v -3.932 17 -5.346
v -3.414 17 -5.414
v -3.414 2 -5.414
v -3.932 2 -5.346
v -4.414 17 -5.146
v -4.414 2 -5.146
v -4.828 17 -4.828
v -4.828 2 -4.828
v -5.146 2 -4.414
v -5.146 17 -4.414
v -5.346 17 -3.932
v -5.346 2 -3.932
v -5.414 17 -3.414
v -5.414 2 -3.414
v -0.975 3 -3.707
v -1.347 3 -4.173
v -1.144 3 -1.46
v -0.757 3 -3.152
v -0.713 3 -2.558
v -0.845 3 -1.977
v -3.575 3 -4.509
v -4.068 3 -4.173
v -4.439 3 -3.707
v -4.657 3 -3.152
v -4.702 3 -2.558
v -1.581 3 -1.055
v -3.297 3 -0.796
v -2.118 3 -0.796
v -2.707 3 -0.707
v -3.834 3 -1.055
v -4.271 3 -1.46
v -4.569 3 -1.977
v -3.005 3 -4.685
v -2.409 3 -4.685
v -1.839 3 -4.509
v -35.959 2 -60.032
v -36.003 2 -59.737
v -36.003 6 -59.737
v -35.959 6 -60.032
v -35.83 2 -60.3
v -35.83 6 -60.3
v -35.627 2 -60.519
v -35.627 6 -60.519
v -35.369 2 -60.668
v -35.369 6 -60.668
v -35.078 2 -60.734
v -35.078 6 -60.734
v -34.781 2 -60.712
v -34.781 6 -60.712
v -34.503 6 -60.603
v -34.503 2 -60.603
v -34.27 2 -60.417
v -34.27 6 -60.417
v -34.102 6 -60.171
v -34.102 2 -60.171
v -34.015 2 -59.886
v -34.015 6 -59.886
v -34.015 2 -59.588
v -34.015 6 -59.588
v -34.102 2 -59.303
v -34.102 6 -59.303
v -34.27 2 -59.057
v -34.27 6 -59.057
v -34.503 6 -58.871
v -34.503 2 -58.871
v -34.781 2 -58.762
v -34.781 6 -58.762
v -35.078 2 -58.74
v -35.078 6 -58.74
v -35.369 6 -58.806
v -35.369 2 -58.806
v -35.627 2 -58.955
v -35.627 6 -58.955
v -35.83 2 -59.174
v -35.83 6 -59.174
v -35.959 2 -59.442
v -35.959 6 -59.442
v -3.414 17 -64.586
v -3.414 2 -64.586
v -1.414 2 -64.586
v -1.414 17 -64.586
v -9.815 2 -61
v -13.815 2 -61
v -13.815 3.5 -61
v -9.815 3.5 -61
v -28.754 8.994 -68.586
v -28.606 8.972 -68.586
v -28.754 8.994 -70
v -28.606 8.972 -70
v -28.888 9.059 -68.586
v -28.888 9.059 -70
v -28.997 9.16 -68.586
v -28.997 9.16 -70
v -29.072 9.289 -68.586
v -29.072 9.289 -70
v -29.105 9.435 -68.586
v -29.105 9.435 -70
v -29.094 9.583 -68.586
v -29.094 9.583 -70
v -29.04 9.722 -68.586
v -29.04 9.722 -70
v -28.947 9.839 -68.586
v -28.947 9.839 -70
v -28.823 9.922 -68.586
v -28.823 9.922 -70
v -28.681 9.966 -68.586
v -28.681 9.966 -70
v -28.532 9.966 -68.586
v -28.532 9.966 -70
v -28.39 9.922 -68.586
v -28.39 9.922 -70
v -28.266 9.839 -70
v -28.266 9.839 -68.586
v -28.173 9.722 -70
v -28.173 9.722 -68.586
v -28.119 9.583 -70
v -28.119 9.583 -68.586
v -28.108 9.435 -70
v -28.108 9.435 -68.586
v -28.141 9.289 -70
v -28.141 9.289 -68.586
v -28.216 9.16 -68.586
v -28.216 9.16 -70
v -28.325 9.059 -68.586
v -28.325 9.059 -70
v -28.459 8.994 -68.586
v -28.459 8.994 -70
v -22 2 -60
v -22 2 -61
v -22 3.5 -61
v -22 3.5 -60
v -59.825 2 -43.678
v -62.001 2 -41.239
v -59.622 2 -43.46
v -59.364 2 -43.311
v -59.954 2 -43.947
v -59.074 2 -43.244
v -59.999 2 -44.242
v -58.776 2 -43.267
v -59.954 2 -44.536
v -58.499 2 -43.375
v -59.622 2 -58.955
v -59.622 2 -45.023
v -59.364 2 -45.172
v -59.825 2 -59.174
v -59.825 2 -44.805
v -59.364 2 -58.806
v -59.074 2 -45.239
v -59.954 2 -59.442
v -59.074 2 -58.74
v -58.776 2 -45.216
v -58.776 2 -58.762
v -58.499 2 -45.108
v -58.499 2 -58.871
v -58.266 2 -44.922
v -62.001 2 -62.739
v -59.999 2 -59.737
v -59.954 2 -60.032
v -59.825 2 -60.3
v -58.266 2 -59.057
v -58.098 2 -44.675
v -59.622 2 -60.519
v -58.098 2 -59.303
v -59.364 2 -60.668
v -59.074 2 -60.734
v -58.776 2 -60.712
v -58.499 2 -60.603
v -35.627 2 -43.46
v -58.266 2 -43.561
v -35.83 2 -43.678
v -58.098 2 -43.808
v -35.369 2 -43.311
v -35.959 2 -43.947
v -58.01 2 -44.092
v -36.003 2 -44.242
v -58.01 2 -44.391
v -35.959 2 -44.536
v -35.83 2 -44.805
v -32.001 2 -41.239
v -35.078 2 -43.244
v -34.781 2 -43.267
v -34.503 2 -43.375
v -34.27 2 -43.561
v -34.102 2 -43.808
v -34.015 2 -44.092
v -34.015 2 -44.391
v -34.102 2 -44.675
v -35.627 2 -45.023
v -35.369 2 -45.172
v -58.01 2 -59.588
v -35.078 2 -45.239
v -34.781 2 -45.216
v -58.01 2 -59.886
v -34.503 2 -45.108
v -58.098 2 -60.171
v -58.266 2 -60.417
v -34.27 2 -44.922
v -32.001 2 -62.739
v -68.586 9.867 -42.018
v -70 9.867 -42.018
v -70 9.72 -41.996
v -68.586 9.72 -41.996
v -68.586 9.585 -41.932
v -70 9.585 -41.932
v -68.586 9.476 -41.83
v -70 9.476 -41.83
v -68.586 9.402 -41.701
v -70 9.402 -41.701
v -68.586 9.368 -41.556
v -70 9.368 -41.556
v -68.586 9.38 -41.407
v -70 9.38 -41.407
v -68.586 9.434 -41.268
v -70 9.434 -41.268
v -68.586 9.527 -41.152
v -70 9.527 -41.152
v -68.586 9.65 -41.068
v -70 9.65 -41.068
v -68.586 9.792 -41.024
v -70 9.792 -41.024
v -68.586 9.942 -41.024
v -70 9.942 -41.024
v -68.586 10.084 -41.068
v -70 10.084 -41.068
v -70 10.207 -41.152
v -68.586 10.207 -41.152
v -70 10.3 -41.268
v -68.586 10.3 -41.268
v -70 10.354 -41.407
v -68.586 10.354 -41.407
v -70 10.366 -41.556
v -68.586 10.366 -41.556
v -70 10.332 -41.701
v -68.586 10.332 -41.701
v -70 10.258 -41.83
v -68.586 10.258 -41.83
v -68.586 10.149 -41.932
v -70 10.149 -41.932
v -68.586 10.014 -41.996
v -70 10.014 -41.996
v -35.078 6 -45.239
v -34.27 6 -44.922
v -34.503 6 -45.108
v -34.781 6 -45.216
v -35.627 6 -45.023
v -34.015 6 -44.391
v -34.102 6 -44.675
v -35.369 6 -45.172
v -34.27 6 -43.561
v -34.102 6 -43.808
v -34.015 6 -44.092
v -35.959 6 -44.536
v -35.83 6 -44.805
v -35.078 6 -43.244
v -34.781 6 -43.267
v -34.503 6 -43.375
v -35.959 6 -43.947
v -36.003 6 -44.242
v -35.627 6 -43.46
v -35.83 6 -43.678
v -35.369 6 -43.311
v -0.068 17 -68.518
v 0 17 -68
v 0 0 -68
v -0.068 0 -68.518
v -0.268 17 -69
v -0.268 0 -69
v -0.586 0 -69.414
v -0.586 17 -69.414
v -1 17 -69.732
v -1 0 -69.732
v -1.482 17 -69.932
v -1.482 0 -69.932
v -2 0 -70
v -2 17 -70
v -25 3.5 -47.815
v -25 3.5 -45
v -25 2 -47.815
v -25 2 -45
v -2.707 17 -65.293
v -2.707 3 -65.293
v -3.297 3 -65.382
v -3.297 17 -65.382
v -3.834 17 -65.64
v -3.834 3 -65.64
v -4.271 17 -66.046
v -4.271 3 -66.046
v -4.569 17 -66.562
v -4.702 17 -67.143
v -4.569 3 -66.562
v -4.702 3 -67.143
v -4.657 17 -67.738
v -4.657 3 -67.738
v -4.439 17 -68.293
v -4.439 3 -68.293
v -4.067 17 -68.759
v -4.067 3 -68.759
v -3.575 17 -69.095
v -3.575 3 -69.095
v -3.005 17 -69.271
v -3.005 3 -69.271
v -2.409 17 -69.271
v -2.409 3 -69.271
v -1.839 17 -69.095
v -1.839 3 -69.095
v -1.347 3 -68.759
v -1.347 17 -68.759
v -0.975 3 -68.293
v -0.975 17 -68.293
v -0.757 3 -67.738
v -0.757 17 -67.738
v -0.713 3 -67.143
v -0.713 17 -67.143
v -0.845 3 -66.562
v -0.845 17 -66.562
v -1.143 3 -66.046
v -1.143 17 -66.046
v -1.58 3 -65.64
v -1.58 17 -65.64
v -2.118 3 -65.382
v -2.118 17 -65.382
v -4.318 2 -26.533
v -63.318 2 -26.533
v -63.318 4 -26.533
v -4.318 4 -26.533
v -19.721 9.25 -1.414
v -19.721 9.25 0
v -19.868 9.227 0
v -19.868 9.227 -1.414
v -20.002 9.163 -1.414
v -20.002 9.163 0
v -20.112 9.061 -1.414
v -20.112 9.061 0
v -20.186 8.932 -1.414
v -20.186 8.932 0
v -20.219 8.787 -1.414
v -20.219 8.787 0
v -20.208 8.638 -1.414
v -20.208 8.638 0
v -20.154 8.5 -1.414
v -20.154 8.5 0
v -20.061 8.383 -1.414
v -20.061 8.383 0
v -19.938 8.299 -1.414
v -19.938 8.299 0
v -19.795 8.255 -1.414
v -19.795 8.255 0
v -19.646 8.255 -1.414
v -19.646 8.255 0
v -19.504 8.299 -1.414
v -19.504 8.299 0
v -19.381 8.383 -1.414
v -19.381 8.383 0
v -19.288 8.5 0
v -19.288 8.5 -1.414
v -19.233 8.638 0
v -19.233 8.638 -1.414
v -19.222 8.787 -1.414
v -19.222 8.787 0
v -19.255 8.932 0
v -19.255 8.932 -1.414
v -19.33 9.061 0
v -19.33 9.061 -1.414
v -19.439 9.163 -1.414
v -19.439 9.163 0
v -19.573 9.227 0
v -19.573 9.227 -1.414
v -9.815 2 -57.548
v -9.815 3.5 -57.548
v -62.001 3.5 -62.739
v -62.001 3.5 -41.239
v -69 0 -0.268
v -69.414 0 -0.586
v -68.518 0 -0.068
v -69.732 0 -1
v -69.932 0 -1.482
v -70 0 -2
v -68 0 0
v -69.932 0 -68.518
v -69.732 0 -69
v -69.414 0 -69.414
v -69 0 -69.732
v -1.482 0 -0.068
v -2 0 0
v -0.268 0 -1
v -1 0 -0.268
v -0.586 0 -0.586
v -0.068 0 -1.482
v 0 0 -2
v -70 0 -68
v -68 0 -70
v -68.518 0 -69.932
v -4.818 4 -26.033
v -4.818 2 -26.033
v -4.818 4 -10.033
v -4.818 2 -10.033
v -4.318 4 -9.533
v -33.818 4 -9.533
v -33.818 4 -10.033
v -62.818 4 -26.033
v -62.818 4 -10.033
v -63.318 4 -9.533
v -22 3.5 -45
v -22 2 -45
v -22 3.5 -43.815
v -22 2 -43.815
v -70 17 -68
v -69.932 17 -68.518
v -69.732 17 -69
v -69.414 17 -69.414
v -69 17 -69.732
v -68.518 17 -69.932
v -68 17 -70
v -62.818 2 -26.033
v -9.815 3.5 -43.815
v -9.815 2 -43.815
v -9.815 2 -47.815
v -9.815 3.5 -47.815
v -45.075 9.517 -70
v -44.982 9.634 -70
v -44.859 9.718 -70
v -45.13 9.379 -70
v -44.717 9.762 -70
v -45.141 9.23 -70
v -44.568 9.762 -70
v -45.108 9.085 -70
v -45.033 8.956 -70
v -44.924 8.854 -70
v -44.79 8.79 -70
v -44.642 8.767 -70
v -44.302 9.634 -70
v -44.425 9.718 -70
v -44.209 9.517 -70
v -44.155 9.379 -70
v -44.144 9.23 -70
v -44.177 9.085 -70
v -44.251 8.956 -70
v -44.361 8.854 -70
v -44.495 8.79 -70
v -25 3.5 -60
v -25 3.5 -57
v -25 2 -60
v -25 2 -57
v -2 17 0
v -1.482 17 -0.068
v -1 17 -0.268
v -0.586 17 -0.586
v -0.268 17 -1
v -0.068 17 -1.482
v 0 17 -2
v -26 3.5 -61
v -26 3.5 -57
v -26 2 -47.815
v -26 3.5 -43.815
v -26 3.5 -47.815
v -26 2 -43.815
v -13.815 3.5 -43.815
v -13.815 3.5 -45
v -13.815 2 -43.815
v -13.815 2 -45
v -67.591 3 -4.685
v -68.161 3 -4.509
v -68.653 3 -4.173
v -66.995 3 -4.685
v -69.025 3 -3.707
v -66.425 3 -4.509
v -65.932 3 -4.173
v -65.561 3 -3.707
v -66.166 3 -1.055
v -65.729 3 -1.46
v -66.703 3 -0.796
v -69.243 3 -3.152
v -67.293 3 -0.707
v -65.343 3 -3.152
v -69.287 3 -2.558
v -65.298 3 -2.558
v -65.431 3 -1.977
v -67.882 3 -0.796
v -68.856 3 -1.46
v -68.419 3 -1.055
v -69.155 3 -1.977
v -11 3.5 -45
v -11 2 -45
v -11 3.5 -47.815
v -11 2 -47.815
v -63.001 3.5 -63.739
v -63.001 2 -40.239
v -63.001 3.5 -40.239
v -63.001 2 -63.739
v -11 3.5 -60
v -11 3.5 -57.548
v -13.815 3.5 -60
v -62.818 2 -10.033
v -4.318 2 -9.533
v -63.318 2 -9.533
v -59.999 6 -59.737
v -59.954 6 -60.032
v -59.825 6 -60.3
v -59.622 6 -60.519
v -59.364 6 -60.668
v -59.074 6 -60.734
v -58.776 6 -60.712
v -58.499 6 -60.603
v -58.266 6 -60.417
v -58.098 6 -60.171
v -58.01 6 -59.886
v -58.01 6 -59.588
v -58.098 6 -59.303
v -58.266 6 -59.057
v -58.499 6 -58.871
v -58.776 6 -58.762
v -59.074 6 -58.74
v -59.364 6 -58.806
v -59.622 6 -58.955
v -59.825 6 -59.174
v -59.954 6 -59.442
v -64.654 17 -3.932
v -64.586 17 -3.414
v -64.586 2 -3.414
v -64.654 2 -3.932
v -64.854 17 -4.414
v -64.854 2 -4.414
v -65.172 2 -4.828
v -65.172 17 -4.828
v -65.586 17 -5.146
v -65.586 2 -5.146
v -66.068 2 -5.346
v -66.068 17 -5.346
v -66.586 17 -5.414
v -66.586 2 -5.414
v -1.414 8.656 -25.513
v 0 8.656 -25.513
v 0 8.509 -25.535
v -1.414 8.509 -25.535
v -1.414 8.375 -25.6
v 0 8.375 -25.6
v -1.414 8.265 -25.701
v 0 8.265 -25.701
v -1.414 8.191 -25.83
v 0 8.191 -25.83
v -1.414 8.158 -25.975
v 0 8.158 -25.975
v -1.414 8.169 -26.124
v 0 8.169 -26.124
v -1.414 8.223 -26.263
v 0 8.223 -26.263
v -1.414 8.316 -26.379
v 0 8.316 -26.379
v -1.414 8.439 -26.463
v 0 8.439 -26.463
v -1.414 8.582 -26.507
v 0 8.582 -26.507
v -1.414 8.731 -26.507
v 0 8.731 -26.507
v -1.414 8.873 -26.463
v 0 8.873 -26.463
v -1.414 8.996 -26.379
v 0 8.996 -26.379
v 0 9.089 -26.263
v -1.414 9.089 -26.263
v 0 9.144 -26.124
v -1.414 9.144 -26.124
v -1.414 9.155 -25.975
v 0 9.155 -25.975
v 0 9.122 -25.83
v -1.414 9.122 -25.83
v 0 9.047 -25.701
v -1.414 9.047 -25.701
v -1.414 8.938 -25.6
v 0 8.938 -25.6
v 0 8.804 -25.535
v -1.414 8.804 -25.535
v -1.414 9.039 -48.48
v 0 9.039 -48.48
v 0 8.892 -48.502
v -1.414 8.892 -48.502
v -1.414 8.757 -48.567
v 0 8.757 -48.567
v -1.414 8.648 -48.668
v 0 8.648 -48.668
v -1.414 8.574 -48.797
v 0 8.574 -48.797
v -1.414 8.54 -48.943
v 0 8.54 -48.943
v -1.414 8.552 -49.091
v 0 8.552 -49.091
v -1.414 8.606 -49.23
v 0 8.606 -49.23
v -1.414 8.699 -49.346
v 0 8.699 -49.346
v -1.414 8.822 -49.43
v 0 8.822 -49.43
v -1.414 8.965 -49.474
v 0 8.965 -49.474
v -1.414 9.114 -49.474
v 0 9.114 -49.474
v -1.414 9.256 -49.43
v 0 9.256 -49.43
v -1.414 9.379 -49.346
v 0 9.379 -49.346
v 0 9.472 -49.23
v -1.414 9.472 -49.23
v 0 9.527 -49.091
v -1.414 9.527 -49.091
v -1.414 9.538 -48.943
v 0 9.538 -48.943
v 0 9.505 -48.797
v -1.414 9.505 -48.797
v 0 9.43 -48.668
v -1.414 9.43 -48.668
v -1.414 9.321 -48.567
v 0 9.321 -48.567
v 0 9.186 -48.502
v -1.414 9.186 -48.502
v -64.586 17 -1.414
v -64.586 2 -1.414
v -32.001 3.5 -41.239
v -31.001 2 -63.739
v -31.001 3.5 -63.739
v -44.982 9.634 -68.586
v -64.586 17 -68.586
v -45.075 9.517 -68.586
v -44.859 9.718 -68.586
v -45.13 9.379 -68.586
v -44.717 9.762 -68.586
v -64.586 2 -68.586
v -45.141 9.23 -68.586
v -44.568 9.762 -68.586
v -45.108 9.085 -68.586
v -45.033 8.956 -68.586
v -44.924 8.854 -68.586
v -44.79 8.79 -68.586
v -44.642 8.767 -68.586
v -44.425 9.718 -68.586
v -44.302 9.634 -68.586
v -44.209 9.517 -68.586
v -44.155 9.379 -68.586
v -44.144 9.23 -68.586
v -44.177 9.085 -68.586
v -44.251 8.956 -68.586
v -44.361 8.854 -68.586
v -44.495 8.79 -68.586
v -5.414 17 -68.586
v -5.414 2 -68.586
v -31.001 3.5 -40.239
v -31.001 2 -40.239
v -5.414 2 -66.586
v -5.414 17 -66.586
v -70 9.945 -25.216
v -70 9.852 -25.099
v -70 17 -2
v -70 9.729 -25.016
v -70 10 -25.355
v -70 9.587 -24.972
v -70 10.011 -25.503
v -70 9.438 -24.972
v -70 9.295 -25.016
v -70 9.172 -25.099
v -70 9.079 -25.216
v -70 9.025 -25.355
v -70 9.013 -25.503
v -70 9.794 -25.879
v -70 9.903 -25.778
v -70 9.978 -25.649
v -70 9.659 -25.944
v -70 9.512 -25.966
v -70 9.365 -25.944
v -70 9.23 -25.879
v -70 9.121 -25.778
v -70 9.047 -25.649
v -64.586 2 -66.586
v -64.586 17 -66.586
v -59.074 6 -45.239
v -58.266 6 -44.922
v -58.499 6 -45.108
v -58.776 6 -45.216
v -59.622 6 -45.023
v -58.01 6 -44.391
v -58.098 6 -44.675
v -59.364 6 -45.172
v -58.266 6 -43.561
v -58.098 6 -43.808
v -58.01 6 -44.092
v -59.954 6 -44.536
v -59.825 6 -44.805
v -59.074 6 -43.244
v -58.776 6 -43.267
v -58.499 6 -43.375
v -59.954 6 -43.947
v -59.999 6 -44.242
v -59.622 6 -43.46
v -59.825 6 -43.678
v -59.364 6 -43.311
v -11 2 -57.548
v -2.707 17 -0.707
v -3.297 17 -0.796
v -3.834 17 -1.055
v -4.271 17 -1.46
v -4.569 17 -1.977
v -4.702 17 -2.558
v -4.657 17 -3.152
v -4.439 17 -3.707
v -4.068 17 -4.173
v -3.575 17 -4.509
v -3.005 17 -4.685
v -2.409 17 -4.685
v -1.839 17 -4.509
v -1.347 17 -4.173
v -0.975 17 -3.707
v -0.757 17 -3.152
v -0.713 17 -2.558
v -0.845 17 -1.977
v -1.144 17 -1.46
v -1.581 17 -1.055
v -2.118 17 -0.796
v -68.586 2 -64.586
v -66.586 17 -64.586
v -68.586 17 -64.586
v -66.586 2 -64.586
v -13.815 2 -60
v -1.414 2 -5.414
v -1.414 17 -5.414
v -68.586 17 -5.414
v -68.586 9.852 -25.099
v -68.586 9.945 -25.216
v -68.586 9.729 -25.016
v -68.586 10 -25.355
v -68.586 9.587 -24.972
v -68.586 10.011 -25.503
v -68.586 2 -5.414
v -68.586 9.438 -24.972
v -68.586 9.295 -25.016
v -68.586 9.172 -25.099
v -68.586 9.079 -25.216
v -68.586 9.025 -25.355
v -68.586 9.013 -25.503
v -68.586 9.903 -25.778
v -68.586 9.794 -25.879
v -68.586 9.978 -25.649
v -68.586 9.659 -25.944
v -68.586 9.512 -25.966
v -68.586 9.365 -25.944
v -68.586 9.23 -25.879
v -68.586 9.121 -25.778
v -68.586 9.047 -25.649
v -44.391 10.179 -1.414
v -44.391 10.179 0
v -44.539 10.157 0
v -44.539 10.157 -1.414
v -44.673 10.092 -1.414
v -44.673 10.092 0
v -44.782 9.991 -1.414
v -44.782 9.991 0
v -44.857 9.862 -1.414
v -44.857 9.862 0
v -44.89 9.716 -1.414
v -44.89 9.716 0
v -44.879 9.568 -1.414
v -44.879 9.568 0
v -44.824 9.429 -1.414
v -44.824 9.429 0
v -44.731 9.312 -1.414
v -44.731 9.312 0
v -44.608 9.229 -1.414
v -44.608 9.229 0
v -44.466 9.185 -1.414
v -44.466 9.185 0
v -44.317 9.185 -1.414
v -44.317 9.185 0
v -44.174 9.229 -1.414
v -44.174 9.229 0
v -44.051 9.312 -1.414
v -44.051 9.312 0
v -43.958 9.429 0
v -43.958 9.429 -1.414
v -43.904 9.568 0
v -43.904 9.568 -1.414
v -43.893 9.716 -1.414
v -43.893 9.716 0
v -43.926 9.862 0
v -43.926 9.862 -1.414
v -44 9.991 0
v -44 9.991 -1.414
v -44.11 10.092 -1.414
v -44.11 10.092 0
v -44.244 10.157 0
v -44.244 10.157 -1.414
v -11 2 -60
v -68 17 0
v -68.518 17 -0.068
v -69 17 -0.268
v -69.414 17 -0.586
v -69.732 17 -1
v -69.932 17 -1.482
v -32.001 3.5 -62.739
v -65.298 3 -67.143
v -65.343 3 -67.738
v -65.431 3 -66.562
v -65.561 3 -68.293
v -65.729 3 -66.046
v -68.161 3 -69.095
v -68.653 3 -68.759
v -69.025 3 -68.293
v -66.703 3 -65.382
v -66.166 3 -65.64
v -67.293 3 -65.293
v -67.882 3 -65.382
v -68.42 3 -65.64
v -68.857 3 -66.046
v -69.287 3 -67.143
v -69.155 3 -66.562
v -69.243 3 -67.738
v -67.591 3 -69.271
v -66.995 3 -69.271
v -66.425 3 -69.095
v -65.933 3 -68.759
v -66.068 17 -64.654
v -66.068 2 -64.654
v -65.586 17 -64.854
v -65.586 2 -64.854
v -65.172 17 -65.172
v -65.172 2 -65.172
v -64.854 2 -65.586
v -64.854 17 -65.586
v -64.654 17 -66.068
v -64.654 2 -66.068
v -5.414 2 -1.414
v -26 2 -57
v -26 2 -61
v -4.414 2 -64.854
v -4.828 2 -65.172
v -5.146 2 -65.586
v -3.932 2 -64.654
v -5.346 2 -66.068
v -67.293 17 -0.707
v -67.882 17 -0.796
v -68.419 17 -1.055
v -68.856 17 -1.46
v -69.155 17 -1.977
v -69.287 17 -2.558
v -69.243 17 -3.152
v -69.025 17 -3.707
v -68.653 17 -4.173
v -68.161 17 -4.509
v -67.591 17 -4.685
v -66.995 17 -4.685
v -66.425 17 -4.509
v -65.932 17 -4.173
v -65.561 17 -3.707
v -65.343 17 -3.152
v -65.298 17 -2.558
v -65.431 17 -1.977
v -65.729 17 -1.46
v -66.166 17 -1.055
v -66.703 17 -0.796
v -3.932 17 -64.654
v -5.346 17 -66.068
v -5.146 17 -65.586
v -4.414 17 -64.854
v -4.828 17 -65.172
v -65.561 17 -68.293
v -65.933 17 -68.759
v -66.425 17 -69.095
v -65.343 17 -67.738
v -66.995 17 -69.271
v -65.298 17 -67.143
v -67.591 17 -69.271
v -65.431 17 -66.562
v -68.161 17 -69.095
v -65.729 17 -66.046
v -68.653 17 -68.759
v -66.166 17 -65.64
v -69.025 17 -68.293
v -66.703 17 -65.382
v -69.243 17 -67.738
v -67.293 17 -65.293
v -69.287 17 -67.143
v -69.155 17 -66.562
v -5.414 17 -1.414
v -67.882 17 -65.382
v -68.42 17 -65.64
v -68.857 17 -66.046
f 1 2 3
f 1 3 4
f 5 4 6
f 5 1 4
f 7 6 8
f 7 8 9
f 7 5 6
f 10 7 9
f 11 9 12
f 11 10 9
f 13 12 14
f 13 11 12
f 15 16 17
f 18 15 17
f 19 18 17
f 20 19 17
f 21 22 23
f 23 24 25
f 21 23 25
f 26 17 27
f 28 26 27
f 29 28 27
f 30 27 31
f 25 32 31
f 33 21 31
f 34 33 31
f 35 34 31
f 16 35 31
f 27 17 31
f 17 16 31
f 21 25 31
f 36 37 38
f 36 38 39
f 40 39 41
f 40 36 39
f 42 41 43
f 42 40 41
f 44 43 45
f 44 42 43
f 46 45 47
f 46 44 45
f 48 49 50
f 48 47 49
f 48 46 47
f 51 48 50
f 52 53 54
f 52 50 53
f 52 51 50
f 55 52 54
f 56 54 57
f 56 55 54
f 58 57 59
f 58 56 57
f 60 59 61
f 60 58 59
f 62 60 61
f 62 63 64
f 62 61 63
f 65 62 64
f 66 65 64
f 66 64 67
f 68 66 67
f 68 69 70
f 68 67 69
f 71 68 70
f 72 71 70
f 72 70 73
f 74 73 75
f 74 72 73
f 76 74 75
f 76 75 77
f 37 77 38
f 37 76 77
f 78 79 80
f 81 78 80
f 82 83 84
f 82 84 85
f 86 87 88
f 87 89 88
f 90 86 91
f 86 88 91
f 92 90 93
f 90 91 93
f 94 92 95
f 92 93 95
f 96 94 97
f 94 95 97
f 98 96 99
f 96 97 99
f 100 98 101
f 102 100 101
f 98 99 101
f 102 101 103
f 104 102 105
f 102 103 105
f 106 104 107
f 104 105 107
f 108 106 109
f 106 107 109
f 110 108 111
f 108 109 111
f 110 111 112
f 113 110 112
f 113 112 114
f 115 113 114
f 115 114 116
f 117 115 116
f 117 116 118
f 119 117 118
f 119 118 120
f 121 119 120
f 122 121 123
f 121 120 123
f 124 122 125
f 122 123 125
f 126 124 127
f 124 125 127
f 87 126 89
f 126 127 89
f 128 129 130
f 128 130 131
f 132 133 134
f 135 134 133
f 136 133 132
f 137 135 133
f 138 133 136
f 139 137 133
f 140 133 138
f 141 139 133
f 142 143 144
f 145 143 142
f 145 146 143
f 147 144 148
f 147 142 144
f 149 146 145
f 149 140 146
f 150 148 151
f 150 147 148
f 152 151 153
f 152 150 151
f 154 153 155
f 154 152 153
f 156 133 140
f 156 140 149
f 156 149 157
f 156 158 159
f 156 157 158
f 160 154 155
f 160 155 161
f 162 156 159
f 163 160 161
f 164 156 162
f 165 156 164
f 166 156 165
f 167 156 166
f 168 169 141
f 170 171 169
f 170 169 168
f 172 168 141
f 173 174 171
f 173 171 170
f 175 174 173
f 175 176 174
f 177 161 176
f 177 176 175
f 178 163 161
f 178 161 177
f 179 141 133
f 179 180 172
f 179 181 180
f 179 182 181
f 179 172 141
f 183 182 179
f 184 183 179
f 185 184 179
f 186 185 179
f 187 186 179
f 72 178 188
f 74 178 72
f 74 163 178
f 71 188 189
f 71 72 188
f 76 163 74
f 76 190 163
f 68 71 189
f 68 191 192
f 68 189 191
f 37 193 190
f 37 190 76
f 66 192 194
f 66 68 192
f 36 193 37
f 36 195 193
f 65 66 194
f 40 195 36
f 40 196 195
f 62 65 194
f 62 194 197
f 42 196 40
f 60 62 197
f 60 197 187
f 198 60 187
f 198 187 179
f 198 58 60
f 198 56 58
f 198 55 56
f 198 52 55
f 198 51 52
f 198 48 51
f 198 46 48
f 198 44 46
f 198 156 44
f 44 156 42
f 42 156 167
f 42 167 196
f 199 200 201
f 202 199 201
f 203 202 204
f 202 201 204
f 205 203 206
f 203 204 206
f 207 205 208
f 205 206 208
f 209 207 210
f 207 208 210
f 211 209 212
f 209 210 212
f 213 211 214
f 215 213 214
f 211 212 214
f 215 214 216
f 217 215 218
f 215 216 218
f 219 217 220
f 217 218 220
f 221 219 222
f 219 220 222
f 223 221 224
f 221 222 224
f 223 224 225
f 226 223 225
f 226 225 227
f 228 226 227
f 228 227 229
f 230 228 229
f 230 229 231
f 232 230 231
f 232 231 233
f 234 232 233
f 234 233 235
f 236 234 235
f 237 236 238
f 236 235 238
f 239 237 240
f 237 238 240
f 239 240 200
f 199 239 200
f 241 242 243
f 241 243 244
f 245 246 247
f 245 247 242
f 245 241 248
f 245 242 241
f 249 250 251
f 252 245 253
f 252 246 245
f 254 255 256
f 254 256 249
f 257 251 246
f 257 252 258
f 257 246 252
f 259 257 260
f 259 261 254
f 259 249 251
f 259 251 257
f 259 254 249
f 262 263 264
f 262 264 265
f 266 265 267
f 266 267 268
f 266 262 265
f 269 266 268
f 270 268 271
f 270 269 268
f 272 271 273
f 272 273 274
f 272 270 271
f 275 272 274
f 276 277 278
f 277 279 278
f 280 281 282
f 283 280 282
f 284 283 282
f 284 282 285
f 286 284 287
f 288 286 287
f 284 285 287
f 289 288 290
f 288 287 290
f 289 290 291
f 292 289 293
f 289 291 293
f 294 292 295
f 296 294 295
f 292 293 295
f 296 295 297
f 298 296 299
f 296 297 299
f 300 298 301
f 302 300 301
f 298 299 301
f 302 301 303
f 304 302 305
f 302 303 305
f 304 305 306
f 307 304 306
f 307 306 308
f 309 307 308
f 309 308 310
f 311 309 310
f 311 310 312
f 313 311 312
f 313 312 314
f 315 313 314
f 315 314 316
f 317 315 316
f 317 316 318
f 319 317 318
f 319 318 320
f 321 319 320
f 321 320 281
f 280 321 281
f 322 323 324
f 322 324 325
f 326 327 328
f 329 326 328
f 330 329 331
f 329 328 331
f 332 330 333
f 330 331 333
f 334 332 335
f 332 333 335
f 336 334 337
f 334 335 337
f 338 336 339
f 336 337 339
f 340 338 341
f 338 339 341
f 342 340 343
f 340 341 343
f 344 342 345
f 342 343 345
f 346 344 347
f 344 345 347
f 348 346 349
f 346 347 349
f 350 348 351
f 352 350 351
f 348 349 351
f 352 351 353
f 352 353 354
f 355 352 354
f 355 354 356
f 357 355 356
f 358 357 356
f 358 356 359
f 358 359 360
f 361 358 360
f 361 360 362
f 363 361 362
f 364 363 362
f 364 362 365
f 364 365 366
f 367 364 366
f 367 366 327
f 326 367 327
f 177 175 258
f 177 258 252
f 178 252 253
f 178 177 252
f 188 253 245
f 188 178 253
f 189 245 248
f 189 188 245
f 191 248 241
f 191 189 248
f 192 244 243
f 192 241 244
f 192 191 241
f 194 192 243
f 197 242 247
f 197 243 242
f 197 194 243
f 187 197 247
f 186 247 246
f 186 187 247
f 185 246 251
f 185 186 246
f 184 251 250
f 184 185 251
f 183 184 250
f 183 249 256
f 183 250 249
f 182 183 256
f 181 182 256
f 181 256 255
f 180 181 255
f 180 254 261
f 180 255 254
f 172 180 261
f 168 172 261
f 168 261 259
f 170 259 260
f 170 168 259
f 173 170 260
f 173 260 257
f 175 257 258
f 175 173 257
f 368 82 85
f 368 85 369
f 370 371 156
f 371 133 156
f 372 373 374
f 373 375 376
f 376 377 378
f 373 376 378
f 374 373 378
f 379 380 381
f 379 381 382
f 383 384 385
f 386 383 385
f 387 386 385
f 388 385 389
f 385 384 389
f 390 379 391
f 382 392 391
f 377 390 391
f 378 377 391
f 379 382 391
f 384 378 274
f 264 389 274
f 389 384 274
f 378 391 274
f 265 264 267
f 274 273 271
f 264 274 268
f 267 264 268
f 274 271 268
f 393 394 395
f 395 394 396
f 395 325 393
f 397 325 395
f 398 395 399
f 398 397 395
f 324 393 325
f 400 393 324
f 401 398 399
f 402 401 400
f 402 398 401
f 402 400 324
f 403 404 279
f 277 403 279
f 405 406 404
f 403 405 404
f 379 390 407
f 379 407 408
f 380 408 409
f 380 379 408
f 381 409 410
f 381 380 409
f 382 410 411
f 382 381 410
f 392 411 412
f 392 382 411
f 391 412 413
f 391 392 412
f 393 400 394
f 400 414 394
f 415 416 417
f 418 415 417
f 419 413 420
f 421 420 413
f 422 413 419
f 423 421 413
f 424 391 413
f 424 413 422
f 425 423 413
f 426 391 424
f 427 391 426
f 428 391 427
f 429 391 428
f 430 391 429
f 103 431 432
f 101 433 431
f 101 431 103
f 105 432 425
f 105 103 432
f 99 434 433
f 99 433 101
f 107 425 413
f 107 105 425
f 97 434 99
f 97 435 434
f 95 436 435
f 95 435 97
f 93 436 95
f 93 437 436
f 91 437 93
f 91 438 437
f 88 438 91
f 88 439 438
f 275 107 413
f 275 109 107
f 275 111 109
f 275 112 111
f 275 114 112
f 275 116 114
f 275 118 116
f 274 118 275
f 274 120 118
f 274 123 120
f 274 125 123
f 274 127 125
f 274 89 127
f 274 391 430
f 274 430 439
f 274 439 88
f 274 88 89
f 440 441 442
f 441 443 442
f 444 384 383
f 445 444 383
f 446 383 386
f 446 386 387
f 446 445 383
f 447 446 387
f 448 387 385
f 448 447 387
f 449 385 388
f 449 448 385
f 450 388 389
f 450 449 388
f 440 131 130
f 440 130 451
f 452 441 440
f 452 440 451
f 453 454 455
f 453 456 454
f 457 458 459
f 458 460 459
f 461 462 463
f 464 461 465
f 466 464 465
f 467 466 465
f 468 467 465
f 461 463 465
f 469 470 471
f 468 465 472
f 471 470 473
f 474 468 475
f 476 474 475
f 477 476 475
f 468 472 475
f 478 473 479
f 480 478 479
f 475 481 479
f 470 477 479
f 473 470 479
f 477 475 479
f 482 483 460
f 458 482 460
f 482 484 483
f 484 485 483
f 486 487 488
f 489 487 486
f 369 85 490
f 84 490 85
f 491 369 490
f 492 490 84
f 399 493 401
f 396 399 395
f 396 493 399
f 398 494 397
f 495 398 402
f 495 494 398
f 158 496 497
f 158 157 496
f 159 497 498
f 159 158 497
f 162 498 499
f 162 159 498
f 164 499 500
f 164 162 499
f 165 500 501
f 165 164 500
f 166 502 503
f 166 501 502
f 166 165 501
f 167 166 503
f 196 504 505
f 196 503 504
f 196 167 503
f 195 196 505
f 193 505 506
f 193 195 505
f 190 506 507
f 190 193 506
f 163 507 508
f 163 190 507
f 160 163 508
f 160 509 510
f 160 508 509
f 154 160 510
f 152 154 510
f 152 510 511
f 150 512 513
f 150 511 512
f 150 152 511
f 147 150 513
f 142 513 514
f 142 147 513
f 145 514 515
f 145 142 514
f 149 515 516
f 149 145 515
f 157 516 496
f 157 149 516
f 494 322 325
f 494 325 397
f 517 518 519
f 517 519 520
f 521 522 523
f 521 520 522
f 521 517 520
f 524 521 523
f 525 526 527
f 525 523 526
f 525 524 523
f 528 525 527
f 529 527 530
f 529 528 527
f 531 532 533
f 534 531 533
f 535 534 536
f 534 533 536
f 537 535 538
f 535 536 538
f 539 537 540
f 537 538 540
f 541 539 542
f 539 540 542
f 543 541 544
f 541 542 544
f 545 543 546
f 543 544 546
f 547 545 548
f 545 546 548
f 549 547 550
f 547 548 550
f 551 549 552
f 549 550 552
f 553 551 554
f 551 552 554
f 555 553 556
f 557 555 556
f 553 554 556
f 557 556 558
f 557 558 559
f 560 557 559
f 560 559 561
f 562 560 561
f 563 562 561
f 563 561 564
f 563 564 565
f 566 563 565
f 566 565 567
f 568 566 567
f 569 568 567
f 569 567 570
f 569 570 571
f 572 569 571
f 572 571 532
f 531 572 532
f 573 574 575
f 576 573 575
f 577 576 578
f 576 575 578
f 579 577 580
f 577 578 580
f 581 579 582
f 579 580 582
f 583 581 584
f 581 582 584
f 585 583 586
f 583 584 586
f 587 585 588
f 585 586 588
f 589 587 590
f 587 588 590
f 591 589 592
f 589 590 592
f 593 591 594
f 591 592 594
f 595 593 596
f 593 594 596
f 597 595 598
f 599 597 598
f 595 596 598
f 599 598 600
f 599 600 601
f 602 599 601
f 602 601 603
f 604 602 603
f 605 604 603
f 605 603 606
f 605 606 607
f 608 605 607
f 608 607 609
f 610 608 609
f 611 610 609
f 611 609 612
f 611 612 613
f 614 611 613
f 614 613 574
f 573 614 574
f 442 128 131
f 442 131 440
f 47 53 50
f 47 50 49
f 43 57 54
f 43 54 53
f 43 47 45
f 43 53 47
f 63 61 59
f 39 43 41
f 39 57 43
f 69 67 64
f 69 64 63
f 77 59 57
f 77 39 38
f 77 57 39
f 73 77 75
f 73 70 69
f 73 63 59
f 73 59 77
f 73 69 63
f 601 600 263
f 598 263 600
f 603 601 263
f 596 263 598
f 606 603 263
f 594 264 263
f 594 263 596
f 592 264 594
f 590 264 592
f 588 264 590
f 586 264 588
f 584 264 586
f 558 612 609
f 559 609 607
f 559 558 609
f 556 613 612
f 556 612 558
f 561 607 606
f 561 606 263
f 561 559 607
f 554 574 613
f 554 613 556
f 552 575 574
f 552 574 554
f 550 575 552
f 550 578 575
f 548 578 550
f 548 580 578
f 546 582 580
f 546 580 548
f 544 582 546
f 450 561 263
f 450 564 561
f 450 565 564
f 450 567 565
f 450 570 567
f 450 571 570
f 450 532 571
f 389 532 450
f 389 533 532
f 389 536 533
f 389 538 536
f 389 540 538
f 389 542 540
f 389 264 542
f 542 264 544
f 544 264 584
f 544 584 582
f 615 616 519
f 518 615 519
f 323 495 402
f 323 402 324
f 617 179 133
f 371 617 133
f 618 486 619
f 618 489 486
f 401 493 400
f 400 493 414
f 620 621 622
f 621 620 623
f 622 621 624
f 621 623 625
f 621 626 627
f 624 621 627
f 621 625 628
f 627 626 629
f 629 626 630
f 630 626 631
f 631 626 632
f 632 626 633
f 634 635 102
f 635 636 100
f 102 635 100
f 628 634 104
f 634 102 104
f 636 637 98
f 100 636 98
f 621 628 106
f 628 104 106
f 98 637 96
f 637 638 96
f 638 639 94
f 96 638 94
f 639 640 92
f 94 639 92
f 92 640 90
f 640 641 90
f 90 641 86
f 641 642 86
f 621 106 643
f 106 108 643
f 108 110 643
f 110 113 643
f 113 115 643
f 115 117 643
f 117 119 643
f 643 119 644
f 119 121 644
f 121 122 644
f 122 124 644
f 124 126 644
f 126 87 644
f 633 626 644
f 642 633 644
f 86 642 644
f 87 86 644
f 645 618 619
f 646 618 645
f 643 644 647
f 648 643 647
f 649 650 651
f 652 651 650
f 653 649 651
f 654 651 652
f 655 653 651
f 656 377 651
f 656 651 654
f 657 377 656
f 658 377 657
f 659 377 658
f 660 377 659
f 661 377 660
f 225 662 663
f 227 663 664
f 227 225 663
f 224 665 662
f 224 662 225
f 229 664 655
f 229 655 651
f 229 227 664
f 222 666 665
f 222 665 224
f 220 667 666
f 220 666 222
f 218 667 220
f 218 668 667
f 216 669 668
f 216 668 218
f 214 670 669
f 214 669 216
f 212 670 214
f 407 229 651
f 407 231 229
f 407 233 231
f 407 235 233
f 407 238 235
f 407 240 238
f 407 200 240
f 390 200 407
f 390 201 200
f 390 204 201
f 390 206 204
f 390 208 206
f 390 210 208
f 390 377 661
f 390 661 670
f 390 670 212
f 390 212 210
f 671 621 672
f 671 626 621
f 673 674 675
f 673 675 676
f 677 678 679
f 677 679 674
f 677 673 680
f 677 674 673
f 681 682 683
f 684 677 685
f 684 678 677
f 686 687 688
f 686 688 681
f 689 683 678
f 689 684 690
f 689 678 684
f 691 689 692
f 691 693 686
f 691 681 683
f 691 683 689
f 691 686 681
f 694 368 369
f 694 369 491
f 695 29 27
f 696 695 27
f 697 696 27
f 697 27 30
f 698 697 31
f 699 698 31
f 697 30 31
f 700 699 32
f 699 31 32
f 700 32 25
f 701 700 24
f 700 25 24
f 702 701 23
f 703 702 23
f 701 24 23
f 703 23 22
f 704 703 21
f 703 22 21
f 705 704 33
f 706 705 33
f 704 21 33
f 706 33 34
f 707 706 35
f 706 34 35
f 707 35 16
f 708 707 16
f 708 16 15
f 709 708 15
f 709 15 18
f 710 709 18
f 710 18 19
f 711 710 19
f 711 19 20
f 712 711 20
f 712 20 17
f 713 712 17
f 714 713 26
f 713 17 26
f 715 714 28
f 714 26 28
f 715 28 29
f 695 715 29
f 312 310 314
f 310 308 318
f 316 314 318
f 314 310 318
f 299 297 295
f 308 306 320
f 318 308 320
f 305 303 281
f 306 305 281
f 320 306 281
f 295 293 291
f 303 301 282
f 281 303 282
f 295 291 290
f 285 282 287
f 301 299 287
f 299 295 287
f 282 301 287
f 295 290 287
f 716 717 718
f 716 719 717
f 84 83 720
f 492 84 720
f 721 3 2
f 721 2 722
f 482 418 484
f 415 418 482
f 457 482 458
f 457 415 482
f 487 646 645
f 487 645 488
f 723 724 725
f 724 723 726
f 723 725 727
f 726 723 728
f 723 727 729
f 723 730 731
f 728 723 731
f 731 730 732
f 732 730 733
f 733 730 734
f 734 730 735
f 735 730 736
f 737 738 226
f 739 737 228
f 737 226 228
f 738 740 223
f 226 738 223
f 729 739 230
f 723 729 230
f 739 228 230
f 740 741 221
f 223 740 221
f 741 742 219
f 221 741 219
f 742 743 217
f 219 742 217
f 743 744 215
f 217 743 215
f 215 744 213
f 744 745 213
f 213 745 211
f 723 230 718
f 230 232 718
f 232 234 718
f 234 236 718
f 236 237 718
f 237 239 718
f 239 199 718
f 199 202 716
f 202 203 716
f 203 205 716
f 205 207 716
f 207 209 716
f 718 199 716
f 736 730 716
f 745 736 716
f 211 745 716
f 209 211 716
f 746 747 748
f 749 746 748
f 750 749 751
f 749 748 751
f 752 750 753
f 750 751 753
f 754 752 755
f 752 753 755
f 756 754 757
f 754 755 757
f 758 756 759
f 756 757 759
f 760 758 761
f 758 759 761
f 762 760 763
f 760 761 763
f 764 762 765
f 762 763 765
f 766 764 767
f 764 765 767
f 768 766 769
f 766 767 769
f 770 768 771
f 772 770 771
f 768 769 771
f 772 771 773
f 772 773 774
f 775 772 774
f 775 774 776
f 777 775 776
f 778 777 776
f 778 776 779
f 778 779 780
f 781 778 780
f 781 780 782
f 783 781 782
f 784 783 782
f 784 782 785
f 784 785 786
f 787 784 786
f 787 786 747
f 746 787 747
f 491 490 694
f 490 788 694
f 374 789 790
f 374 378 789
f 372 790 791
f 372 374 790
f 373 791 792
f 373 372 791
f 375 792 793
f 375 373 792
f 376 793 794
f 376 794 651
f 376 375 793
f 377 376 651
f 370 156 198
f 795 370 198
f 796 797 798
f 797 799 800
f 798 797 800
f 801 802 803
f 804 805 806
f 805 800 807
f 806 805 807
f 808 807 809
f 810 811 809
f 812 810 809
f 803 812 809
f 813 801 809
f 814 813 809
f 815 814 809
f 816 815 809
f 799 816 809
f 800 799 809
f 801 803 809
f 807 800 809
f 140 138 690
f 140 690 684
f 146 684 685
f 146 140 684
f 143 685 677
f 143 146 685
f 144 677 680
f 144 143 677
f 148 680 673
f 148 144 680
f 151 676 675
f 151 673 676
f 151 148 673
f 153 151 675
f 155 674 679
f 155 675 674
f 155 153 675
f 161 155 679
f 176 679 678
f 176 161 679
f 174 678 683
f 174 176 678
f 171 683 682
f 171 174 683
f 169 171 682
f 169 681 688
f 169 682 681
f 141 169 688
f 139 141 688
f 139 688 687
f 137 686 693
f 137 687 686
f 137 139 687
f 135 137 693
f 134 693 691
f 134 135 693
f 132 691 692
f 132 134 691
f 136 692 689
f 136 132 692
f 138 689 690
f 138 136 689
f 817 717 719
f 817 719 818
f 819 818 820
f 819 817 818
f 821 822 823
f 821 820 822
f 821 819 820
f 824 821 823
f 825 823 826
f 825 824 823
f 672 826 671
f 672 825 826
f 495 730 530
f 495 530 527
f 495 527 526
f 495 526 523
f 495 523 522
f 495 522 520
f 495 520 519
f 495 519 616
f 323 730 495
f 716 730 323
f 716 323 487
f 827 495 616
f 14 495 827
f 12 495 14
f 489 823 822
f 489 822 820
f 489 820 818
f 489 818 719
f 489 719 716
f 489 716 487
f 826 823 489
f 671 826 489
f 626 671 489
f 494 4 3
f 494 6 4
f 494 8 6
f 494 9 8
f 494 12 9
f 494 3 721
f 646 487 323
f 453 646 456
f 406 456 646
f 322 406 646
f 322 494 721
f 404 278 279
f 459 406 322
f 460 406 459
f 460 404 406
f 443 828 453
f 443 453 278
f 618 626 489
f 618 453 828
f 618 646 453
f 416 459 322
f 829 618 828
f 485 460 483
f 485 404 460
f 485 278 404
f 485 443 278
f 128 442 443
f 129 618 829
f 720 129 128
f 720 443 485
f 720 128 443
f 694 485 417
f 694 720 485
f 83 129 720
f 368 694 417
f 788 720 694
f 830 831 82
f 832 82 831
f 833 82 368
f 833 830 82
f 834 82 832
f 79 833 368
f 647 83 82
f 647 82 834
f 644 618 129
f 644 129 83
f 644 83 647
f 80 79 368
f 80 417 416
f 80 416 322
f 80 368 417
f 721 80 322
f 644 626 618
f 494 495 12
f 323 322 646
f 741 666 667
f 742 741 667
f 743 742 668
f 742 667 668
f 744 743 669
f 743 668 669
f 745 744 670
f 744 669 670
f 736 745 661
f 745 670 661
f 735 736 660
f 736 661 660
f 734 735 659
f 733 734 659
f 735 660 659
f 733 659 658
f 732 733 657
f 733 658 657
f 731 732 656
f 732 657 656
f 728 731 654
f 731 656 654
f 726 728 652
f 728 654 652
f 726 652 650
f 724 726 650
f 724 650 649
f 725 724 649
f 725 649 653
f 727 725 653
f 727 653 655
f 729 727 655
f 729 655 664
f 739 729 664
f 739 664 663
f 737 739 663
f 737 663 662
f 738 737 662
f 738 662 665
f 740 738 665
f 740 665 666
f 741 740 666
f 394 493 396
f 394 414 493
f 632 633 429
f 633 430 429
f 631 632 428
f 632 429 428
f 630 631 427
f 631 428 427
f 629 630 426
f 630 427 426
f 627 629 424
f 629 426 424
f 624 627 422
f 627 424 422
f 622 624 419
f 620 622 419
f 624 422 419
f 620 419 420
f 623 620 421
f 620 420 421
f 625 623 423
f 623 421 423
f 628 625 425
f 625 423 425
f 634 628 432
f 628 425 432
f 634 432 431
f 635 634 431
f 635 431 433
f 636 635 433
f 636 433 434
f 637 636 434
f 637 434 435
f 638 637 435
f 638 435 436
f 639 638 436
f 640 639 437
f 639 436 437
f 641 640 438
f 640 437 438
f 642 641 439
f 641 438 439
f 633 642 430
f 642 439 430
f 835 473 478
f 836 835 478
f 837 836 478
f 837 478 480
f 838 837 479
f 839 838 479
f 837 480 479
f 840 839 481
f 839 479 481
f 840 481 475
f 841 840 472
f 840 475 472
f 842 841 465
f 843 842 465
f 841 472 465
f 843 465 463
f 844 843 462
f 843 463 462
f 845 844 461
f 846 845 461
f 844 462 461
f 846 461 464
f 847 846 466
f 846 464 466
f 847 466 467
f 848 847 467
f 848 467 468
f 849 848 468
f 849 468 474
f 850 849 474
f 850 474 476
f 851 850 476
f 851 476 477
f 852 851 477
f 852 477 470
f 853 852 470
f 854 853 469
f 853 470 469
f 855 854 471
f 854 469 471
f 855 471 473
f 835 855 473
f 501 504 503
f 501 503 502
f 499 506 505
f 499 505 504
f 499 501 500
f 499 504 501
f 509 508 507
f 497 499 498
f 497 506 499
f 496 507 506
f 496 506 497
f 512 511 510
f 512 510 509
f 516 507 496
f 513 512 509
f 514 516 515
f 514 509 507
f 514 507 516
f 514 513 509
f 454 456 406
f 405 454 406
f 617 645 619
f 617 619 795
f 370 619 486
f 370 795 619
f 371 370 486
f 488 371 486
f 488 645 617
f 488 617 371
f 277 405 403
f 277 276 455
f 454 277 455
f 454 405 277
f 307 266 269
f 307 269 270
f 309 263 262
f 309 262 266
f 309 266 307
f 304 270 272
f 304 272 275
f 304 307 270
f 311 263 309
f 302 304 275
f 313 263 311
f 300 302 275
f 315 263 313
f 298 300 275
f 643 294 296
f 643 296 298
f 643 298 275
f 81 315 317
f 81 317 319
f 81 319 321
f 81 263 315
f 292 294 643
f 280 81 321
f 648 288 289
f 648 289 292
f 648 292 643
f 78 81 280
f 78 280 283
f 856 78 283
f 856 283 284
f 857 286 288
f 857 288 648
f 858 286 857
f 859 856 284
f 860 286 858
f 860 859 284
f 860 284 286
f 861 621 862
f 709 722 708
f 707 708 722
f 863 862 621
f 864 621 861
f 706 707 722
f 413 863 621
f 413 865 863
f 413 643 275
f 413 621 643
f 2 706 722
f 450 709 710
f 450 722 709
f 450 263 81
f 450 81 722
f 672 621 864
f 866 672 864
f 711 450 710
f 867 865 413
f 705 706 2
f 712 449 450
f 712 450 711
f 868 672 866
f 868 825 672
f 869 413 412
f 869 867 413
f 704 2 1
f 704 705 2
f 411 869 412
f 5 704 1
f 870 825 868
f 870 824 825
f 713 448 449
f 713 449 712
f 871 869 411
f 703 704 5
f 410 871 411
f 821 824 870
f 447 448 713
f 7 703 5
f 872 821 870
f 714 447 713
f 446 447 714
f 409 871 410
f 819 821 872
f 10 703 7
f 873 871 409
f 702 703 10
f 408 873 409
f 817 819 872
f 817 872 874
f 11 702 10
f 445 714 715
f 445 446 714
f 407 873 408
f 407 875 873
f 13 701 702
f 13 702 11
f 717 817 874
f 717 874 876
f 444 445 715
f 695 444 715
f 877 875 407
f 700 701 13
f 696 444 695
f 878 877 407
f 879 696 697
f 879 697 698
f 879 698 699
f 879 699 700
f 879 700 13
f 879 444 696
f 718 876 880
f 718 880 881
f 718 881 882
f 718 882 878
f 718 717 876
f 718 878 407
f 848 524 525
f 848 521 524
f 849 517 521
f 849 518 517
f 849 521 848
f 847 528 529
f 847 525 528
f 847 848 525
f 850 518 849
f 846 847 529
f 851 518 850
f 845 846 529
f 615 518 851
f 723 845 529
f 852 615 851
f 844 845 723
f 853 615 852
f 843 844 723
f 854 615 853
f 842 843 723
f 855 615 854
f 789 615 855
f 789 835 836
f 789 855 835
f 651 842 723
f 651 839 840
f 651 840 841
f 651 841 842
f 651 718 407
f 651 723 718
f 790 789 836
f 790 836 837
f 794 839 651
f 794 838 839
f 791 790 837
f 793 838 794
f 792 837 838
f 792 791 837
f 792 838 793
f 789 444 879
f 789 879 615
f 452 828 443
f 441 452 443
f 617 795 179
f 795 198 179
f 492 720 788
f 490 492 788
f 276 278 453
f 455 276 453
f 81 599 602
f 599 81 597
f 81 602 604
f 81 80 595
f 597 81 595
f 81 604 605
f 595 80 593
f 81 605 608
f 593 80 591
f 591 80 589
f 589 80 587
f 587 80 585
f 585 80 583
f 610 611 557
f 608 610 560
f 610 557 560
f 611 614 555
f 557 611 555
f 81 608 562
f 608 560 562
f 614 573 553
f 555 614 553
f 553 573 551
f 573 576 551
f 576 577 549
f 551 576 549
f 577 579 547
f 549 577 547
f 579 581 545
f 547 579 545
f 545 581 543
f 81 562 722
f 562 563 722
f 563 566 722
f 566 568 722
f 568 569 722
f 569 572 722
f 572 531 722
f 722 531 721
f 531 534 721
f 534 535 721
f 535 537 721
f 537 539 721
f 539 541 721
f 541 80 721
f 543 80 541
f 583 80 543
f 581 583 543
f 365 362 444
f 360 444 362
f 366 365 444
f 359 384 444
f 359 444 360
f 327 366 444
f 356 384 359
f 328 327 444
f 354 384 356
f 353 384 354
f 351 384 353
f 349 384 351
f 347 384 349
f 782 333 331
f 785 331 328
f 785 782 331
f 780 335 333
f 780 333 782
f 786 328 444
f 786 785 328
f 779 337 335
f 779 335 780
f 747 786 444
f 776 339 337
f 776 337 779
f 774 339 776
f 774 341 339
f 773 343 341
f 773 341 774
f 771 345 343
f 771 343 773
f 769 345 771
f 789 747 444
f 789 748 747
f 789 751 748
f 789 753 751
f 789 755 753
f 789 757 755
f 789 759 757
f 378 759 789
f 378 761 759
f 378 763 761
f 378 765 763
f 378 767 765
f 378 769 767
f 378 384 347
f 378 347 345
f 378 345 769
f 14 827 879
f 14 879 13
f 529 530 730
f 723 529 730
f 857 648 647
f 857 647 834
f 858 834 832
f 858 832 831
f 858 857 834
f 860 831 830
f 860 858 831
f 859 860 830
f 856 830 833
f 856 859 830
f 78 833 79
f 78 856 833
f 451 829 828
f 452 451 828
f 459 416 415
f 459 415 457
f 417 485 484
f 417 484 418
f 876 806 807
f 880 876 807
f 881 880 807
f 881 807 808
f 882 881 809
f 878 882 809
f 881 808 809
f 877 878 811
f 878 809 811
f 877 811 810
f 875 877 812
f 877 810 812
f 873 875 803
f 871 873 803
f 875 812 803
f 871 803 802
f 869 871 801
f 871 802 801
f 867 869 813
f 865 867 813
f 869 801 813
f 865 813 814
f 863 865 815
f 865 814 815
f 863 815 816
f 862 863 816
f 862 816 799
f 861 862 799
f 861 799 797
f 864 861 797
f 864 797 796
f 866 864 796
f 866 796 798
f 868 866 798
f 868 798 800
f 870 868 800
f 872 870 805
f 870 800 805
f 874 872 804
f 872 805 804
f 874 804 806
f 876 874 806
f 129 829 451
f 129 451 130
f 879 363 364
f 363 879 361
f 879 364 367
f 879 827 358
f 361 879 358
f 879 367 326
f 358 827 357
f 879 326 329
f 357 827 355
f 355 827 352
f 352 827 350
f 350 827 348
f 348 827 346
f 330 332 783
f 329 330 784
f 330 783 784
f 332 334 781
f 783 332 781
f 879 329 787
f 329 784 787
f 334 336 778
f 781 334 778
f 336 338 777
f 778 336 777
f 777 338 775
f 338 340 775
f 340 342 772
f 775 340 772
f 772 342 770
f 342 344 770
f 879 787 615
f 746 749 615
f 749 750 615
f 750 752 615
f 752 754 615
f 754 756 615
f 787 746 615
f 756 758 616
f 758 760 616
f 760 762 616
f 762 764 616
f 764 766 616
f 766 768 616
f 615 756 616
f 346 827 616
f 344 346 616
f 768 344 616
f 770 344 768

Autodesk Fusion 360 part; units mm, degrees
sketch "Sketch1" plane through (0, 0, 0) normal (0, 1, 0) x (1, 0, 0)
  line L0 (0, 0) -> (-70, 0)
  line L1 (-70, 0) -> (-70, 70)
  line L2 (-70, 70) -> (0, 70)
  line L3 (0, 70) -> (0, 0)
  dimension "d1" = 70
  dimension "d2" = 70
extrude "Extrude1" add sketch "Sketch1" along normal blind 2
sketch "Sketch2" plane through (0, 2, 0) normal (0, 1, 0) x (-1, 0, 0)
  line L0 (0, -70) -> (70, -70)
  line L1 (70, -70) -> (70, 0)
  line L2 (70, 0) -> (0, 0)
  line L3 (0, 0) -> (0, -70)
  line L4 (62.0012, -62.7393) -> (32.0012, -62.7393)
  line L5 (32.0012, -62.7393) -> (32.0012, -41.2393)
  line L6 (32.0012, -41.2393) -> (62.0012, -41.2393)
  line L7 (62.0012, -41.2393) -> (62.0012, -62.7393)
  line L8 (13.8147, -60) -> (11, -60)
  line L9 (25, -45) -> (25, -47.8147)
  line L10 (62.0012, -62.7393) -> (63.4154, -62.7393) construction
  line L11 (32.0012, -41.2393) -> (33.4154, -41.2393) construction
  line L12 (63.0012, -63.7393) -> (31.0012, -63.7393)
  line L13 (31.0012, -63.7393) -> (31.0012, -40.2393)
  line L14 (31.0012, -40.2393) -> (63.0012, -40.2393)
  line L15 (63.0012, -40.2393) -> (63.0012, -63.7393)
  line L16 (13.8147, -61) -> (9.8147, -61)
  line L17 (26, -43.8147) -> (26, -47.8147)
  line L18 (62.0012, -62.7393) -> (66.2472, -62.7393) construction
  circle A0 centre (58.9988, -59.7369) radius 1
  line L19 (26, -61) -> (22, -61)
  line L20 (9.8147, -61) -> (13.8147, -61)
  line L21 (13.8147, -61) -> (13.8147, -60)
  line L22 (9.8147, -61) -> (9.8147, -57.5477)
  line L23 (9.8147, -57.5477) -> (11, -57.5477)
  line L24 (9.8147, -43.8147) -> (9.8147, -47.8147)
  line L25 (11, -47.8147) -> (9.8147, -47.8147)
  line L26 (9.8147, -43.8147) -> (13.8147, -43.8147)
  line L27 (13.8147, -45) -> (13.8147, -43.8147)
  line L28 (26, -43.8147) -> (22, -43.8147)
  line L29 (22, -43.8147) -> (22, -45)
  line L30 (26, -43.8147) -> (26, -47.8147)
  line L31 (25, -47.8147) -> (26.1763, -47.8147)
  line L32 (11, -45) -> (13.8147, -45)
  line L33 (22, -45) -> (25, -45)
  line L34 (9.8147, -43.8147) -> (13.8147, -43.8147)
  line L35 (22, -43.8147) -> (26, -43.8147)
  line L36 (26, -61) -> (26, -57)
  line L37 (26, -57) -> (25, -57)
  line L38 (25, -57) -> (25, -60)
  line L39 (22, -61) -> (22, -60)
  line L40 (22, -60) -> (25, -60)
  line L41 (9.8147, -61) -> (9.8147, -57.5477)
  line L42 (9.8147, -47.8147) -> (9.8147, -43.8147)
  line L43 (11, -60) -> (11, -57.5477)
  line L44 (11, -47.8147) -> (11, -45)
  line L45 (33.8182, -10.0332) -> (4.8182, -10.0332)
  line L46 (58.5866, -26.0332) -> (4.8182, -26.0332)
  line L47 (33.8182, -9.5332) -> (4.3182, -9.5332)
  line L48 (4.8182, -10.0332) -> (62.8182, -10.0332)
  line L49 (63.3182, -26.5332) -> (4.3182, -26.5332)
  line L50 (4.8182, -16.9457) -> (4.8182, -10.0332)
  line L51 (4.3182, -26.5332) -> (4.3182, -9.5332)
  line L52 (58.5866, -26.0332) -> (62.8182, -26.0332)
  line L53 (63.3182, -9.5332) -> (63.3182, -26.5332)
  line L54 (4.8182, -16.9457) -> (4.8182, -26.0332)
  line L55 (33.8182, -9.5332) -> (63.3182, -9.5332)
  line L56 (62.8182, -19.4958) -> (62.8182, -10.0332)
  line L57 (33.8182, -10.0332) -> (62.8182, -10.0332)
  line L58 (62.8182, -19.4958) -> (62.8182, -26.0332)
  line L59 (33.8182, -10.0332) -> (33.8182, -9.5332)
  line L60 (31.0012, -40.2393) -> (36.6612, -40.2393) construction
  circle A1 centre (35.0034, -44.2415) radius 1
  line L61 (63.0012, -40.2393) -> (68.6612, -40.2393) construction
  line L62 (31.0012, -63.7393) -> (36.6612, -63.7393) construction
  circle A2 centre (35.0034, -59.7371) radius 1
  circle A3 centre (58.9989, -44.2415) radius 1
  point P0 (33.8182, -10.0332)
  dimension "d5" = 30
  dimension "d6" = 21.5
  dimension "d7" = 14
  dimension "d8" = 15
  dimension "d9" = 1.4142
  dimension "d12" = 1.4142
  dimension "d14" = 4.246
  dimension "d15" = 2
  dimension "d34" = 4
  dimension "d35" = 4
  dimension "d36" = 4
  dimension "d37" = 4
  dimension "d38" = 4
  dimension "d39" = 4
  dimension "d72" = 0.5
  dimension "d76" = 5.66
  dimension "d77" = 2
  dimension "d79" = 5.66
  dimension "d80" = 5.66
  dimension "d82" = 2
  dimension "d83" = 2
extrude "Extrude2" add sketch "Sketch2" along normal blind 4 contours A0
extrude "Extrude7" add sketch "Sketch2" along normal blind 4 contours A1 | A2 | A3
extrude "Extrude3" add sketch "Sketch2" along normal blind 1.5 contours L12 L13 L14 L15
extrude "Extrude4" add sketch "Sketch2" along normal blind 1.5 contours L8 L16 L20 L21 L22 L23 L41 L43 | L9 L17 L28 L29 L30 L31 L33 L35 | L19 L36 L37 L38 L39 L40 | L24 L25 L26 L27 L32 L34 L42 L44
sketch "Sketch3" plane through (0, 2, 0) normal (0, 1, 0) x (-1, 0, 0)
  line L0 (70, -70) -> (74, -70) construction
  line L1 (0, 0) -> (4, 0) construction
  line L2 (64.5858, -68.5858) -> (5.4142, -68.5858)
  line L3 (1.4142, -64.5858) -> (1.4142, -5.4142)
  line L4 (5.4142, -1.4142) -> (64.5858, -1.4142)
  line L5 (68.5858, -5.4142) -> (68.5858, -64.5858)
  line L6 (5.4142, -1.4142) -> (5.4142, -5.4142)
  line L7 (1.4142, -5.5403) -> (1.4142, -5.4142)
  line L8 (5.4142, -1.4142) -> (5.4142, -5.4142)
  line L9 (5.4142, -5.4142) -> (1.4142, -5.4142)
  line L10 (64.5858, -1.4142) -> (64.5858, -5.4142)
  line L11 (64.5858, -5.4142) -> (68.5858, -5.4142)
  line L12 (64.5858, -68.5858) -> (64.5858, -64.5858)
  line L13 (64.5858, -64.5858) -> (68.5858, -64.5858)
  line L14 (5.4142, -68.5858) -> (5.4142, -64.5858)
  line L15 (5.4142, -64.5858) -> (1.4142, -64.5858)
  line L16 (0, 0) -> (70, 0)
  line L17 (70, 0) -> (70, -70)
  line L18 (70, -70) -> (0, -70)
  line L19 (0, -70) -> (0, 0)
extrude "Extrude5" add sketch "Sketch3" along normal blind 15
hole "Hole1" at (-1.4142, 9.0391, -48.9799) direction (1, 0, 0) diameter 1 depth 14 tip angle 180
hole "Hole2" at (-1.4142, 8.6563, -26.0128) direction (1, 0, 0) diameter 1 depth 14 tip angle 180
hole "Hole3" at (-19.7207, 8.7497, -1.4142) direction (0, 0, 1) diameter 1 depth 14 tip angle 180
hole "Hole4" at (-44.3914, 9.679, -1.4142) direction (0, 0, 1) diameter 1 depth 14 tip angle 180
hole "Hole5" at (-68.5858, 9.867, -41.5184) direction (-1, 0, 0) diameter 1 depth 14 tip angle 180
hole "Hole6" at (-68.5858, 9.5121, -25.466) direction (-1, 0, 0) diameter 1 depth 14 tip angle 180
hole "Hole7" at (-44.6422, 9.2674, -68.5858) direction (0, 0, -1) diameter 1 depth 14 tip angle 180
hole "Hole8" at (-28.6065, 9.472, -68.5858) direction (0, 0, -1) diameter 1 depth 14 tip angle 180
sketch "Sketch4" plane through (0, 17, 0) normal (0, 1, 0) x (-1, 0, 0)
  line L0 (64.5858, -64.5858) -> (64.5858, -68.5858)
  line L1 (64.5858, -68.5858) -> (5.4142, -68.5858)
  line L2 (5.4142, -68.5858) -> (5.4142, -64.5858)
  line L3 (5.4142, -64.5858) -> (1.4142, -64.5858)
  line L4 (1.4142, -64.5858) -> (1.4142, -5.4142)
  line L5 (1.4142, -5.4142) -> (5.4142, -5.4142)
  line L6 (5.4142, -5.4142) -> (5.4142, -1.4142)
  line L7 (5.4142, -1.4142) -> (64.5858, -1.4142)
  line L8 (64.5858, -1.4142) -> (64.5858, -5.4142)
  line L9 (64.5858, -5.4142) -> (68.5858, -5.4142)
  line L10 (68.5858, -5.4142) -> (68.5858, -64.5858)
  line L11 (68.5858, -64.5858) -> (64.5858, -64.5858)
  line L12 (0, -70) -> (70, -70)
  line L13 (70, -70) -> (70, 0)
  line L14 (70, 0) -> (0, 0)
  line L15 (0, 0) -> (0, -70)
  line L16 (70, 0) -> (67.2928, -2.7072)
  line L17 (0, 0) -> (2.7072, -2.7072)
  line L18 (0, -70) -> (2.7071, -67.2929)
  line L19 (70, -70) -> (67.2929, -67.2929)
  dimension "d67" = 3.8285
  dimension "d68" = 3.8285
hole "Hole9" at (-2.7072, 17, -2.7072) at (-67.2928, 17, -2.7072) at (-67.2929, 17, -67.2929) at (-2.7071, 17, -67.2929) direction (0, -1, 0) diameter 4 depth 14 tip angle 180
sketch "Sketch5" plane through (0, 2, 0) normal (0, 1, 0) x (-1, 0, 0)
extrude "Extrude6" add sketch "Sketch2" along normal blind 2 contours L47 L49 L51 L53 L55
fillet "Fillet1" radius 2 1 edges at (-64.5858, 9.5, -64.5858)
fillet "Fillet2" radius 2 3 edges at (-5.4142, 9.5, -5.4142) (-5.4142, 9.5, -64.5858) (-64.5858, 9.5, -5.4142)
fillet "Fillet3" radius 2 3 edges at (-70, 8.5, -70) (0, 8.5, -70) (-70, 8.5, 0)
fillet "Fillet4" radius 2 1 edges at (0, 8.5, 0)
equation "d9 = ( sqrt(2) ) * 1 mm"
equation "d12 = ( sqrt(2) ) * 1 mm"
equation "d67 = 7.657 mm / 2"
equation "d68 = 7.657 mm / 2"
